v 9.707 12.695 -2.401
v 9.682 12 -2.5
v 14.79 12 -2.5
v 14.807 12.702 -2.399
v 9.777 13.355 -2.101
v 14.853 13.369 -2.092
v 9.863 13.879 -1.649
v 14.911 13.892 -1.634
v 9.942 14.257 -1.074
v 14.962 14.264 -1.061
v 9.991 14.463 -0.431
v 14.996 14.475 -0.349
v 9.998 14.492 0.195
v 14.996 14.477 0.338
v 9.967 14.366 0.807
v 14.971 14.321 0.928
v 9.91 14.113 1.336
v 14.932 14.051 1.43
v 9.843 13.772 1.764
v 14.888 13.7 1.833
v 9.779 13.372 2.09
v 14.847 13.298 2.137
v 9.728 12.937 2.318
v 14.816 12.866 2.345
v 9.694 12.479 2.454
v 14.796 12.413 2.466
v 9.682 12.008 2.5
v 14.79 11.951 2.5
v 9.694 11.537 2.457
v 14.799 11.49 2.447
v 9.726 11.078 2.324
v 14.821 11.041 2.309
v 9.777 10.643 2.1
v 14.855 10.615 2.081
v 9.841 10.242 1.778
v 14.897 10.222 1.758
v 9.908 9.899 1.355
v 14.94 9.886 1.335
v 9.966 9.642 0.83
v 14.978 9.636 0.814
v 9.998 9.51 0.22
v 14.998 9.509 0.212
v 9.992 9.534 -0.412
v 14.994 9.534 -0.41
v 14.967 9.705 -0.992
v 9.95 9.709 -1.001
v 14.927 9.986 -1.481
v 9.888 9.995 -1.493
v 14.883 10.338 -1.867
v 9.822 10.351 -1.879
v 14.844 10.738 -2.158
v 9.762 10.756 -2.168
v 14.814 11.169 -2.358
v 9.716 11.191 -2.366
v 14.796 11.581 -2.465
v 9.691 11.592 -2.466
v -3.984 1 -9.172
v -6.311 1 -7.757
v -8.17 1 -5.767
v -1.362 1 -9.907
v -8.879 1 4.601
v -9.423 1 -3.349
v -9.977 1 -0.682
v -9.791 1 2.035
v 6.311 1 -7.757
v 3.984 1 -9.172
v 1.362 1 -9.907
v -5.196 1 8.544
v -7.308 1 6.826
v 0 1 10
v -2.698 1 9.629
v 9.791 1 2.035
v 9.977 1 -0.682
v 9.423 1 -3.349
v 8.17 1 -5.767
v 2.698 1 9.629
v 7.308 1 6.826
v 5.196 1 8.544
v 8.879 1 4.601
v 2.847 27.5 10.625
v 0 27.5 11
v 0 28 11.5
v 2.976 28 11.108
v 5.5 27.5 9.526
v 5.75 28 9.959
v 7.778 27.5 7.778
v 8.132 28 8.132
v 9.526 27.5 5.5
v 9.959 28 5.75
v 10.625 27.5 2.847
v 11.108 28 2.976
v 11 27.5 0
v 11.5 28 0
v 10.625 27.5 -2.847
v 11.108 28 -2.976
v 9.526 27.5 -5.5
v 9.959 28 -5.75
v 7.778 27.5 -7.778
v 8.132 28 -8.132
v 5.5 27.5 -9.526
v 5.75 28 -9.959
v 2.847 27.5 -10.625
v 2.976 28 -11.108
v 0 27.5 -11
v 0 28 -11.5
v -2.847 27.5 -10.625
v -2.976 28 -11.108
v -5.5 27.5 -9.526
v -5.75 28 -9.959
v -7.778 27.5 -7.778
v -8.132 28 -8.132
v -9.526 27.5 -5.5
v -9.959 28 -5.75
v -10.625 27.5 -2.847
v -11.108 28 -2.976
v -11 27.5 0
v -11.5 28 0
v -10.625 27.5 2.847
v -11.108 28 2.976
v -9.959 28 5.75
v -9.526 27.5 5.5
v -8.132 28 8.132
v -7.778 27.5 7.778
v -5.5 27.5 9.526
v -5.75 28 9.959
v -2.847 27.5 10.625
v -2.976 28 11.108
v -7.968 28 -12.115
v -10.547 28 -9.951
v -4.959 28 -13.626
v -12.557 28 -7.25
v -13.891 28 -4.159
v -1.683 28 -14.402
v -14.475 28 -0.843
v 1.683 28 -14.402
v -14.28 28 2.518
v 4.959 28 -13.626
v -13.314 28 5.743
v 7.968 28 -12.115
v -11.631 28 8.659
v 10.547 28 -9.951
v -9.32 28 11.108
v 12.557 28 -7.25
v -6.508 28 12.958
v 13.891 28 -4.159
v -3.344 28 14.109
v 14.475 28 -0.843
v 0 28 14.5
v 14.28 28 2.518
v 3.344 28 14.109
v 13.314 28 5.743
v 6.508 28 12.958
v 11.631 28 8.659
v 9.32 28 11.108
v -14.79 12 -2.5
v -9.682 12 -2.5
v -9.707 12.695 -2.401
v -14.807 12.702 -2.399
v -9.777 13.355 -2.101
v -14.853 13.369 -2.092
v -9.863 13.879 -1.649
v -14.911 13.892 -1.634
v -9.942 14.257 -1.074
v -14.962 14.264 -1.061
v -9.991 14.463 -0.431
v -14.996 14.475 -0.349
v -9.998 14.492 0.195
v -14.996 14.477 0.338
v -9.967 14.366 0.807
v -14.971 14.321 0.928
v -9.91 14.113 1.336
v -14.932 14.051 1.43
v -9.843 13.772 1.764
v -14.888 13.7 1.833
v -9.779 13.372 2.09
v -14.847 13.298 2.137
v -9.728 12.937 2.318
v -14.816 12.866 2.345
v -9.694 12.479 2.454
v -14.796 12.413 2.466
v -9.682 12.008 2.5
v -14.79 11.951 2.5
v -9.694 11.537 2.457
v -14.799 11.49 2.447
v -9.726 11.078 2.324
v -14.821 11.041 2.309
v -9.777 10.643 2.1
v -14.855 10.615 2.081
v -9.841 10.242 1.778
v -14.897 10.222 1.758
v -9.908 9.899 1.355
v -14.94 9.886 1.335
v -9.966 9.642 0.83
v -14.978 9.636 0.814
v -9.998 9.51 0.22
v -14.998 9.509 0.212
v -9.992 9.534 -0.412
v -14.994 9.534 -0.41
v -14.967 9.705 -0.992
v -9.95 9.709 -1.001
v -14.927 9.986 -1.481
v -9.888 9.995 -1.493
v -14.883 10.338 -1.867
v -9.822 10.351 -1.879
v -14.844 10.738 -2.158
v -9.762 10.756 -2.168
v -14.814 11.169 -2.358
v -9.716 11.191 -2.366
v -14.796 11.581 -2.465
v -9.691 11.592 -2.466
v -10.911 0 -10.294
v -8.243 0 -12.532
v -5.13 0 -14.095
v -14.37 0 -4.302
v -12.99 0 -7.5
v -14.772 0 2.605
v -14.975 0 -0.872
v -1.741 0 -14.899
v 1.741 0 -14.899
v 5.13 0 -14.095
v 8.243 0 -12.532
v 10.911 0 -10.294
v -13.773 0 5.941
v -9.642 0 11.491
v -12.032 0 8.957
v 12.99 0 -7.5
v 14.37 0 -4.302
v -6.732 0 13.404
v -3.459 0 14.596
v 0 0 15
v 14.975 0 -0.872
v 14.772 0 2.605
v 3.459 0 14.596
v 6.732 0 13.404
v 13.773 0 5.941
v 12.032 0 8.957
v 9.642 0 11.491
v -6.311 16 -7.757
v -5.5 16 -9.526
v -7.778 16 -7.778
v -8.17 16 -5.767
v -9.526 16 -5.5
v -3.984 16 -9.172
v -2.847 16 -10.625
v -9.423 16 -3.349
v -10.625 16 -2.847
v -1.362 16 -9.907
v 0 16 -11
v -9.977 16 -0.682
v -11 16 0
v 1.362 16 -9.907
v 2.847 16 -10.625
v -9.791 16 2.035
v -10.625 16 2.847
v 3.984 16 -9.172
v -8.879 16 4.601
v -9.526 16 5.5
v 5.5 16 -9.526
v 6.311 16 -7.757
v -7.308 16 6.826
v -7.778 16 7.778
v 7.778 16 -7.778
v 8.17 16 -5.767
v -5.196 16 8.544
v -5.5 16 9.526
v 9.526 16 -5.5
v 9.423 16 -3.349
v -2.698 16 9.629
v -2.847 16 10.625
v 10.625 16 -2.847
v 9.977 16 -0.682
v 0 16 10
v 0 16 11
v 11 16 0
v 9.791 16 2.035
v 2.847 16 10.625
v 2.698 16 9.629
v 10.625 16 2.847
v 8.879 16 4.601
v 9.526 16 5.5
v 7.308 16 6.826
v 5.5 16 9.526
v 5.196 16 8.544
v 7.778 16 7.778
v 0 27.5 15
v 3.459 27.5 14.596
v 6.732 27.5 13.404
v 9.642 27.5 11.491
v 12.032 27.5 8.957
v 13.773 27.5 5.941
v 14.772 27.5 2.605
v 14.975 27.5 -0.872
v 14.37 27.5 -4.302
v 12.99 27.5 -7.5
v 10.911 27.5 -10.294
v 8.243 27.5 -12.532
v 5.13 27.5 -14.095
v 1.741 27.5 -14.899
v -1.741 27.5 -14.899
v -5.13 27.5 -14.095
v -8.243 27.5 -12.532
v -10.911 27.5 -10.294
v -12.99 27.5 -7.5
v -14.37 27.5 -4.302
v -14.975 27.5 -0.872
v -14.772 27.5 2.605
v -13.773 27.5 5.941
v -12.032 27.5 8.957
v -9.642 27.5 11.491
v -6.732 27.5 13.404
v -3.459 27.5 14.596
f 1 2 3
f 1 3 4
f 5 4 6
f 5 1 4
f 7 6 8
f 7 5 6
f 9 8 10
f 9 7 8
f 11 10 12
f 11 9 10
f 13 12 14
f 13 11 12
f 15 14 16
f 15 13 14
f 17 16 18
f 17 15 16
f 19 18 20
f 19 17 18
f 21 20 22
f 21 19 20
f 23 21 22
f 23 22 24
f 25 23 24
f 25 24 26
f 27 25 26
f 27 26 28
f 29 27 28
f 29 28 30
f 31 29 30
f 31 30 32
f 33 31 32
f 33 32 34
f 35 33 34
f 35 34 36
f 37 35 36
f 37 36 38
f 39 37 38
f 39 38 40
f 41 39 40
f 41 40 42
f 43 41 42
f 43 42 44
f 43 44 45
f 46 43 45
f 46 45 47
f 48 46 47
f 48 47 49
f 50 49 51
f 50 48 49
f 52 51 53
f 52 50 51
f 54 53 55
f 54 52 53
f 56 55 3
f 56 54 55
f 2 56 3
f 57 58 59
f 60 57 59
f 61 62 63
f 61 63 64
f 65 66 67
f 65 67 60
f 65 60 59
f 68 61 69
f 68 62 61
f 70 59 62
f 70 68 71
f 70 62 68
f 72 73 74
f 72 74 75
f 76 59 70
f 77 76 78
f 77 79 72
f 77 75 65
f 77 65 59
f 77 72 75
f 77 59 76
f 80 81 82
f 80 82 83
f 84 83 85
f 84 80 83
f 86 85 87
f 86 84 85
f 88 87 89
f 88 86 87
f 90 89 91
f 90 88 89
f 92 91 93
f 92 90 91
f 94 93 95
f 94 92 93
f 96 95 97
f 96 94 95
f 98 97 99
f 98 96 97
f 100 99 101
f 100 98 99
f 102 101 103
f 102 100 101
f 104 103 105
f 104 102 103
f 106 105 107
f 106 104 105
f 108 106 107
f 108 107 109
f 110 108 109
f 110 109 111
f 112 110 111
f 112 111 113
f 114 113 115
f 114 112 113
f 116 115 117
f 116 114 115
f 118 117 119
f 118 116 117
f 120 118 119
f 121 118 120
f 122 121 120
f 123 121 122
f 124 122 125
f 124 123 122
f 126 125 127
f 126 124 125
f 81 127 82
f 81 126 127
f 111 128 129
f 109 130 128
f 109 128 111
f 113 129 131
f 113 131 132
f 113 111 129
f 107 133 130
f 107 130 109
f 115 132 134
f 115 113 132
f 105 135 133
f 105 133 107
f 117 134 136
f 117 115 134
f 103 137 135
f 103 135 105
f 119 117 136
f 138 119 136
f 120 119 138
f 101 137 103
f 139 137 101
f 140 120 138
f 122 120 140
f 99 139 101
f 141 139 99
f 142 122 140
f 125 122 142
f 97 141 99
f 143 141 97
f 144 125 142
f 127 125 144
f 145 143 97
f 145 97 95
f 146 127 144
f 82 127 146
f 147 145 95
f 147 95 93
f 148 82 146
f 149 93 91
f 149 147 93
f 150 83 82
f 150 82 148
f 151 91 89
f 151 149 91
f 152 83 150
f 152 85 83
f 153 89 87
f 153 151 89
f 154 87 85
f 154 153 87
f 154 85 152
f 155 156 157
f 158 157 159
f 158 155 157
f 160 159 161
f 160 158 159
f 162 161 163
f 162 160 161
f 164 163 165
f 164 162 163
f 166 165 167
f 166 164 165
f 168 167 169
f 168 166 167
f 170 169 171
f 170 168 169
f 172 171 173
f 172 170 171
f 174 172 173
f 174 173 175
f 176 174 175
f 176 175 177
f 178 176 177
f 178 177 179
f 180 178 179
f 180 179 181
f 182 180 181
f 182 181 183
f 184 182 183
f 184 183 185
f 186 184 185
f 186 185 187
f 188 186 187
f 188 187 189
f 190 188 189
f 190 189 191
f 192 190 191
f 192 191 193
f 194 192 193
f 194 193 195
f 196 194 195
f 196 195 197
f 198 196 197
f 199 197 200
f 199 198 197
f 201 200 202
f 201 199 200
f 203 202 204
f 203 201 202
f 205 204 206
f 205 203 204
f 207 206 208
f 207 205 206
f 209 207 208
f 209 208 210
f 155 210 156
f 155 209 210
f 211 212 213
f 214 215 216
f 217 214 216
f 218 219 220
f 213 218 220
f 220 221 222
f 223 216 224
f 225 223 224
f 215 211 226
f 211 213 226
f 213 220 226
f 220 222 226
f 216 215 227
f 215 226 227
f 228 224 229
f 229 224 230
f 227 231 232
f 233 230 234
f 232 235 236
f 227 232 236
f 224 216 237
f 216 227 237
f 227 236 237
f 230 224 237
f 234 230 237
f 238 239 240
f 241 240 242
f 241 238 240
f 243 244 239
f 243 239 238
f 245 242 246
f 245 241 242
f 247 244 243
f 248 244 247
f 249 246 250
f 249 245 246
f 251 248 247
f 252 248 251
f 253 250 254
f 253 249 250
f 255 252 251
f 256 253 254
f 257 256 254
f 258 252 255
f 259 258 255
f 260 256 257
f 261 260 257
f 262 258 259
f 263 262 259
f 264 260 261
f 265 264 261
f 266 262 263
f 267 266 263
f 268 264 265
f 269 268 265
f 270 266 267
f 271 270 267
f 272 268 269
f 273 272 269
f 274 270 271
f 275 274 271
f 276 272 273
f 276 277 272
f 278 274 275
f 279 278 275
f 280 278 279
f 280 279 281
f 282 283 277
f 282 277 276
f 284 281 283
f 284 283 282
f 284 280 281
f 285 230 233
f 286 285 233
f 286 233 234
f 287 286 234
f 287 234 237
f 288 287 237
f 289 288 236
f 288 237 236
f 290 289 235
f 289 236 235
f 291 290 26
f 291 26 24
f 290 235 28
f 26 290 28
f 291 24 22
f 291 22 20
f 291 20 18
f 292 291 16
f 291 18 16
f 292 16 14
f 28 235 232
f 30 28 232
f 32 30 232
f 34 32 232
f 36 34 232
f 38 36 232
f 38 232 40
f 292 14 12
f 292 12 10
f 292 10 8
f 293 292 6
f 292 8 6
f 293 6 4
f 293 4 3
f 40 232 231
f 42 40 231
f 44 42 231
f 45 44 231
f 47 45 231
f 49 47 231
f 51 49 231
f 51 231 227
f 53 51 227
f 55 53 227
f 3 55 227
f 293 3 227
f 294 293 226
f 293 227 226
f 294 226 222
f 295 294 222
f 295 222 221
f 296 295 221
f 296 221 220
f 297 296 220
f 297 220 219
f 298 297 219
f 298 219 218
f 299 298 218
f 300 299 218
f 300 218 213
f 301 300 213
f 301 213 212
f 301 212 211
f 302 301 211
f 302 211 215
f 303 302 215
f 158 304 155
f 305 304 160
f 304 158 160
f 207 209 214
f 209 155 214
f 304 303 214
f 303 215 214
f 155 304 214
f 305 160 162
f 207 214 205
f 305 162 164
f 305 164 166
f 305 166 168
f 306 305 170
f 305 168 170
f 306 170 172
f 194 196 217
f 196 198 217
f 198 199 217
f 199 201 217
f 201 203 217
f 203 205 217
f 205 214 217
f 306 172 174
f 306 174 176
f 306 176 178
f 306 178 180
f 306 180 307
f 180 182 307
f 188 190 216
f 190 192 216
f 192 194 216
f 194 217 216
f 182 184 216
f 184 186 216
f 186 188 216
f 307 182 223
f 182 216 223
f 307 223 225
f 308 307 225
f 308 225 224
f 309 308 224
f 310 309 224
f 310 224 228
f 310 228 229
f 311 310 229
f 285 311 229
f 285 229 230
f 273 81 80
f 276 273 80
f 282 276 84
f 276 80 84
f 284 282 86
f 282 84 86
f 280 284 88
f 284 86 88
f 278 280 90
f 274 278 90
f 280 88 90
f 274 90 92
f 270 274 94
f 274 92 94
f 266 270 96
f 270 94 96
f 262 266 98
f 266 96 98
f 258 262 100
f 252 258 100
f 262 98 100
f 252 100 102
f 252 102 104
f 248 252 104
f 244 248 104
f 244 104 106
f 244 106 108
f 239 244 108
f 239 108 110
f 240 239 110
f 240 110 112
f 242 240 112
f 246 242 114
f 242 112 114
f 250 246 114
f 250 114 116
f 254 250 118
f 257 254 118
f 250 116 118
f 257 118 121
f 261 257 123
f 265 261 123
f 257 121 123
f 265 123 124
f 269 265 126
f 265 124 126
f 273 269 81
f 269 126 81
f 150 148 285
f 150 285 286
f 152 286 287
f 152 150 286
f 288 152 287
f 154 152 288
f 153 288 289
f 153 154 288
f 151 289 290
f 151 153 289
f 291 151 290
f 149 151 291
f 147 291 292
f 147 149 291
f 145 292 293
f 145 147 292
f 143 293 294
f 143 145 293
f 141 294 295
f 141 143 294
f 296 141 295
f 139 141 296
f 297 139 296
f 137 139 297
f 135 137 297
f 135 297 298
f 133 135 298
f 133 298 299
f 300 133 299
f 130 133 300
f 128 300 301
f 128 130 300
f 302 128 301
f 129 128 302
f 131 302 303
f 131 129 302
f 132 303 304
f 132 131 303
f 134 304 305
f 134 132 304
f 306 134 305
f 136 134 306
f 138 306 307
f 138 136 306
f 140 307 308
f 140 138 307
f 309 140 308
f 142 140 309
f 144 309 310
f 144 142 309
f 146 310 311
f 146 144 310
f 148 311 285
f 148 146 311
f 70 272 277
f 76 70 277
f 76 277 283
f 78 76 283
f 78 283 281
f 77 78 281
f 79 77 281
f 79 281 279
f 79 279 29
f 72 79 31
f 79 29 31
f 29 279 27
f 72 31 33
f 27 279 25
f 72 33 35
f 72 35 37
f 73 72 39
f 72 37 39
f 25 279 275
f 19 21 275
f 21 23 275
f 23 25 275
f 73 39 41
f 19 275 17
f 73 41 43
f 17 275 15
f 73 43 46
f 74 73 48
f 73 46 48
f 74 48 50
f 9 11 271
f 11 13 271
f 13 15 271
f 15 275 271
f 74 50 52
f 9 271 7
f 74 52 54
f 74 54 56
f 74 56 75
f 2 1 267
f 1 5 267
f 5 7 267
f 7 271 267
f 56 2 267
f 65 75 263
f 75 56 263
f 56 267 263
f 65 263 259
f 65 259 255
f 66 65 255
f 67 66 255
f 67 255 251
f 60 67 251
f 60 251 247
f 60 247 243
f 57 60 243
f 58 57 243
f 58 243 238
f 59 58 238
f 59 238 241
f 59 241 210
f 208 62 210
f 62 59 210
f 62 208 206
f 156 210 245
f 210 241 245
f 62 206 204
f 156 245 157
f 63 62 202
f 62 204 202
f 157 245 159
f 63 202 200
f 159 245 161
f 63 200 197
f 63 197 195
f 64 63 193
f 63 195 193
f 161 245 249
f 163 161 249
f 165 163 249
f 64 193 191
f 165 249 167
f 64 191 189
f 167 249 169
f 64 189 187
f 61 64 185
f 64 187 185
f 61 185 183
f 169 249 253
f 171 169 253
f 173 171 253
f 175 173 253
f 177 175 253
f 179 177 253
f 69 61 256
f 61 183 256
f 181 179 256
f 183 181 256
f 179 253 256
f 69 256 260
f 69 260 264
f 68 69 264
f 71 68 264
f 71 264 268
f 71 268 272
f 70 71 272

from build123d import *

# Parameters (mm, degrees)
SKETCH1_R               = 15
BOSS_EXTRUDE1_DEPTH     = 28
SKETCH2_R               = 10
CUT_EXTRUDE1_DEPTH      = 27
SKETCH3_R               = 11
CUT_EXTRUDE2_DEPTH      = 12
CUT_EXTRUDE3_DEPTH      = 36.128336141
CUT_EXTRUDE3_DEPTH_BACK = 36.128336141
SKETCH4_R               = 2.5
CHAMFER1_SIZE           = 0.5


with BuildPart() as part:
    # Sketch1 → Boss-Extrude1 (new body)
    with BuildSketch(Plane(origin=(0, 0, 0), x_dir=(1, 0, 0), z_dir=(0, 1, 0))):
        with Locations(Location((0, 0, 0), (0, 0, 270))):
            Circle(SKETCH1_R)
    extrude(amount=BOSS_EXTRUDE1_DEPTH)

    # Sketch2 → Cut-Extrude1 (cut)
    with BuildSketch(Plane(origin=(0, 28, 0), x_dir=(1, 0, 0), z_dir=(0, 1, 0))):
        with Locations(Location((0, 0, 0), (0, 0, 270))):
            Circle(SKETCH2_R)
    extrude(amount=-CUT_EXTRUDE1_DEPTH, mode=Mode.SUBTRACT)

    # Sketch3 → Cut-Extrude2 (cut)
    with BuildSketch(Plane(origin=(0, 28, 0), x_dir=(1, 0, 0), z_dir=(0, 1, 0))):
        with Locations(Location((0, 0, 0), (0, 0, 270))):
            Circle(SKETCH3_R)
    extrude(amount=-CUT_EXTRUDE2_DEPTH, mode=Mode.SUBTRACT)

    # Sketch4 → Cut-Extrude3 (cut, two sides: drawn at the far end of the back side and taken through both)
    with BuildSketch(Plane(origin=(0, 0, 0), x_dir=(0, 0, -1), z_dir=(1, 0, 0)).offset(-CUT_EXTRUDE3_DEPTH_BACK)):
        with Locations((0, 12)):
            Circle(SKETCH4_R)
    extrude(amount=CUT_EXTRUDE3_DEPTH + CUT_EXTRUDE3_DEPTH_BACK, mode=Mode.SUBTRACT)

    # Chamfer1
    chamfer1_edges = [part.edges().sort_by_distance(p)[0] for p in [
        (0, 28, -11),
        (0, 28, -15),
    ]]
    chamfer(chamfer1_edges, length=CHAMFER1_SIZE)


solid = part.part
